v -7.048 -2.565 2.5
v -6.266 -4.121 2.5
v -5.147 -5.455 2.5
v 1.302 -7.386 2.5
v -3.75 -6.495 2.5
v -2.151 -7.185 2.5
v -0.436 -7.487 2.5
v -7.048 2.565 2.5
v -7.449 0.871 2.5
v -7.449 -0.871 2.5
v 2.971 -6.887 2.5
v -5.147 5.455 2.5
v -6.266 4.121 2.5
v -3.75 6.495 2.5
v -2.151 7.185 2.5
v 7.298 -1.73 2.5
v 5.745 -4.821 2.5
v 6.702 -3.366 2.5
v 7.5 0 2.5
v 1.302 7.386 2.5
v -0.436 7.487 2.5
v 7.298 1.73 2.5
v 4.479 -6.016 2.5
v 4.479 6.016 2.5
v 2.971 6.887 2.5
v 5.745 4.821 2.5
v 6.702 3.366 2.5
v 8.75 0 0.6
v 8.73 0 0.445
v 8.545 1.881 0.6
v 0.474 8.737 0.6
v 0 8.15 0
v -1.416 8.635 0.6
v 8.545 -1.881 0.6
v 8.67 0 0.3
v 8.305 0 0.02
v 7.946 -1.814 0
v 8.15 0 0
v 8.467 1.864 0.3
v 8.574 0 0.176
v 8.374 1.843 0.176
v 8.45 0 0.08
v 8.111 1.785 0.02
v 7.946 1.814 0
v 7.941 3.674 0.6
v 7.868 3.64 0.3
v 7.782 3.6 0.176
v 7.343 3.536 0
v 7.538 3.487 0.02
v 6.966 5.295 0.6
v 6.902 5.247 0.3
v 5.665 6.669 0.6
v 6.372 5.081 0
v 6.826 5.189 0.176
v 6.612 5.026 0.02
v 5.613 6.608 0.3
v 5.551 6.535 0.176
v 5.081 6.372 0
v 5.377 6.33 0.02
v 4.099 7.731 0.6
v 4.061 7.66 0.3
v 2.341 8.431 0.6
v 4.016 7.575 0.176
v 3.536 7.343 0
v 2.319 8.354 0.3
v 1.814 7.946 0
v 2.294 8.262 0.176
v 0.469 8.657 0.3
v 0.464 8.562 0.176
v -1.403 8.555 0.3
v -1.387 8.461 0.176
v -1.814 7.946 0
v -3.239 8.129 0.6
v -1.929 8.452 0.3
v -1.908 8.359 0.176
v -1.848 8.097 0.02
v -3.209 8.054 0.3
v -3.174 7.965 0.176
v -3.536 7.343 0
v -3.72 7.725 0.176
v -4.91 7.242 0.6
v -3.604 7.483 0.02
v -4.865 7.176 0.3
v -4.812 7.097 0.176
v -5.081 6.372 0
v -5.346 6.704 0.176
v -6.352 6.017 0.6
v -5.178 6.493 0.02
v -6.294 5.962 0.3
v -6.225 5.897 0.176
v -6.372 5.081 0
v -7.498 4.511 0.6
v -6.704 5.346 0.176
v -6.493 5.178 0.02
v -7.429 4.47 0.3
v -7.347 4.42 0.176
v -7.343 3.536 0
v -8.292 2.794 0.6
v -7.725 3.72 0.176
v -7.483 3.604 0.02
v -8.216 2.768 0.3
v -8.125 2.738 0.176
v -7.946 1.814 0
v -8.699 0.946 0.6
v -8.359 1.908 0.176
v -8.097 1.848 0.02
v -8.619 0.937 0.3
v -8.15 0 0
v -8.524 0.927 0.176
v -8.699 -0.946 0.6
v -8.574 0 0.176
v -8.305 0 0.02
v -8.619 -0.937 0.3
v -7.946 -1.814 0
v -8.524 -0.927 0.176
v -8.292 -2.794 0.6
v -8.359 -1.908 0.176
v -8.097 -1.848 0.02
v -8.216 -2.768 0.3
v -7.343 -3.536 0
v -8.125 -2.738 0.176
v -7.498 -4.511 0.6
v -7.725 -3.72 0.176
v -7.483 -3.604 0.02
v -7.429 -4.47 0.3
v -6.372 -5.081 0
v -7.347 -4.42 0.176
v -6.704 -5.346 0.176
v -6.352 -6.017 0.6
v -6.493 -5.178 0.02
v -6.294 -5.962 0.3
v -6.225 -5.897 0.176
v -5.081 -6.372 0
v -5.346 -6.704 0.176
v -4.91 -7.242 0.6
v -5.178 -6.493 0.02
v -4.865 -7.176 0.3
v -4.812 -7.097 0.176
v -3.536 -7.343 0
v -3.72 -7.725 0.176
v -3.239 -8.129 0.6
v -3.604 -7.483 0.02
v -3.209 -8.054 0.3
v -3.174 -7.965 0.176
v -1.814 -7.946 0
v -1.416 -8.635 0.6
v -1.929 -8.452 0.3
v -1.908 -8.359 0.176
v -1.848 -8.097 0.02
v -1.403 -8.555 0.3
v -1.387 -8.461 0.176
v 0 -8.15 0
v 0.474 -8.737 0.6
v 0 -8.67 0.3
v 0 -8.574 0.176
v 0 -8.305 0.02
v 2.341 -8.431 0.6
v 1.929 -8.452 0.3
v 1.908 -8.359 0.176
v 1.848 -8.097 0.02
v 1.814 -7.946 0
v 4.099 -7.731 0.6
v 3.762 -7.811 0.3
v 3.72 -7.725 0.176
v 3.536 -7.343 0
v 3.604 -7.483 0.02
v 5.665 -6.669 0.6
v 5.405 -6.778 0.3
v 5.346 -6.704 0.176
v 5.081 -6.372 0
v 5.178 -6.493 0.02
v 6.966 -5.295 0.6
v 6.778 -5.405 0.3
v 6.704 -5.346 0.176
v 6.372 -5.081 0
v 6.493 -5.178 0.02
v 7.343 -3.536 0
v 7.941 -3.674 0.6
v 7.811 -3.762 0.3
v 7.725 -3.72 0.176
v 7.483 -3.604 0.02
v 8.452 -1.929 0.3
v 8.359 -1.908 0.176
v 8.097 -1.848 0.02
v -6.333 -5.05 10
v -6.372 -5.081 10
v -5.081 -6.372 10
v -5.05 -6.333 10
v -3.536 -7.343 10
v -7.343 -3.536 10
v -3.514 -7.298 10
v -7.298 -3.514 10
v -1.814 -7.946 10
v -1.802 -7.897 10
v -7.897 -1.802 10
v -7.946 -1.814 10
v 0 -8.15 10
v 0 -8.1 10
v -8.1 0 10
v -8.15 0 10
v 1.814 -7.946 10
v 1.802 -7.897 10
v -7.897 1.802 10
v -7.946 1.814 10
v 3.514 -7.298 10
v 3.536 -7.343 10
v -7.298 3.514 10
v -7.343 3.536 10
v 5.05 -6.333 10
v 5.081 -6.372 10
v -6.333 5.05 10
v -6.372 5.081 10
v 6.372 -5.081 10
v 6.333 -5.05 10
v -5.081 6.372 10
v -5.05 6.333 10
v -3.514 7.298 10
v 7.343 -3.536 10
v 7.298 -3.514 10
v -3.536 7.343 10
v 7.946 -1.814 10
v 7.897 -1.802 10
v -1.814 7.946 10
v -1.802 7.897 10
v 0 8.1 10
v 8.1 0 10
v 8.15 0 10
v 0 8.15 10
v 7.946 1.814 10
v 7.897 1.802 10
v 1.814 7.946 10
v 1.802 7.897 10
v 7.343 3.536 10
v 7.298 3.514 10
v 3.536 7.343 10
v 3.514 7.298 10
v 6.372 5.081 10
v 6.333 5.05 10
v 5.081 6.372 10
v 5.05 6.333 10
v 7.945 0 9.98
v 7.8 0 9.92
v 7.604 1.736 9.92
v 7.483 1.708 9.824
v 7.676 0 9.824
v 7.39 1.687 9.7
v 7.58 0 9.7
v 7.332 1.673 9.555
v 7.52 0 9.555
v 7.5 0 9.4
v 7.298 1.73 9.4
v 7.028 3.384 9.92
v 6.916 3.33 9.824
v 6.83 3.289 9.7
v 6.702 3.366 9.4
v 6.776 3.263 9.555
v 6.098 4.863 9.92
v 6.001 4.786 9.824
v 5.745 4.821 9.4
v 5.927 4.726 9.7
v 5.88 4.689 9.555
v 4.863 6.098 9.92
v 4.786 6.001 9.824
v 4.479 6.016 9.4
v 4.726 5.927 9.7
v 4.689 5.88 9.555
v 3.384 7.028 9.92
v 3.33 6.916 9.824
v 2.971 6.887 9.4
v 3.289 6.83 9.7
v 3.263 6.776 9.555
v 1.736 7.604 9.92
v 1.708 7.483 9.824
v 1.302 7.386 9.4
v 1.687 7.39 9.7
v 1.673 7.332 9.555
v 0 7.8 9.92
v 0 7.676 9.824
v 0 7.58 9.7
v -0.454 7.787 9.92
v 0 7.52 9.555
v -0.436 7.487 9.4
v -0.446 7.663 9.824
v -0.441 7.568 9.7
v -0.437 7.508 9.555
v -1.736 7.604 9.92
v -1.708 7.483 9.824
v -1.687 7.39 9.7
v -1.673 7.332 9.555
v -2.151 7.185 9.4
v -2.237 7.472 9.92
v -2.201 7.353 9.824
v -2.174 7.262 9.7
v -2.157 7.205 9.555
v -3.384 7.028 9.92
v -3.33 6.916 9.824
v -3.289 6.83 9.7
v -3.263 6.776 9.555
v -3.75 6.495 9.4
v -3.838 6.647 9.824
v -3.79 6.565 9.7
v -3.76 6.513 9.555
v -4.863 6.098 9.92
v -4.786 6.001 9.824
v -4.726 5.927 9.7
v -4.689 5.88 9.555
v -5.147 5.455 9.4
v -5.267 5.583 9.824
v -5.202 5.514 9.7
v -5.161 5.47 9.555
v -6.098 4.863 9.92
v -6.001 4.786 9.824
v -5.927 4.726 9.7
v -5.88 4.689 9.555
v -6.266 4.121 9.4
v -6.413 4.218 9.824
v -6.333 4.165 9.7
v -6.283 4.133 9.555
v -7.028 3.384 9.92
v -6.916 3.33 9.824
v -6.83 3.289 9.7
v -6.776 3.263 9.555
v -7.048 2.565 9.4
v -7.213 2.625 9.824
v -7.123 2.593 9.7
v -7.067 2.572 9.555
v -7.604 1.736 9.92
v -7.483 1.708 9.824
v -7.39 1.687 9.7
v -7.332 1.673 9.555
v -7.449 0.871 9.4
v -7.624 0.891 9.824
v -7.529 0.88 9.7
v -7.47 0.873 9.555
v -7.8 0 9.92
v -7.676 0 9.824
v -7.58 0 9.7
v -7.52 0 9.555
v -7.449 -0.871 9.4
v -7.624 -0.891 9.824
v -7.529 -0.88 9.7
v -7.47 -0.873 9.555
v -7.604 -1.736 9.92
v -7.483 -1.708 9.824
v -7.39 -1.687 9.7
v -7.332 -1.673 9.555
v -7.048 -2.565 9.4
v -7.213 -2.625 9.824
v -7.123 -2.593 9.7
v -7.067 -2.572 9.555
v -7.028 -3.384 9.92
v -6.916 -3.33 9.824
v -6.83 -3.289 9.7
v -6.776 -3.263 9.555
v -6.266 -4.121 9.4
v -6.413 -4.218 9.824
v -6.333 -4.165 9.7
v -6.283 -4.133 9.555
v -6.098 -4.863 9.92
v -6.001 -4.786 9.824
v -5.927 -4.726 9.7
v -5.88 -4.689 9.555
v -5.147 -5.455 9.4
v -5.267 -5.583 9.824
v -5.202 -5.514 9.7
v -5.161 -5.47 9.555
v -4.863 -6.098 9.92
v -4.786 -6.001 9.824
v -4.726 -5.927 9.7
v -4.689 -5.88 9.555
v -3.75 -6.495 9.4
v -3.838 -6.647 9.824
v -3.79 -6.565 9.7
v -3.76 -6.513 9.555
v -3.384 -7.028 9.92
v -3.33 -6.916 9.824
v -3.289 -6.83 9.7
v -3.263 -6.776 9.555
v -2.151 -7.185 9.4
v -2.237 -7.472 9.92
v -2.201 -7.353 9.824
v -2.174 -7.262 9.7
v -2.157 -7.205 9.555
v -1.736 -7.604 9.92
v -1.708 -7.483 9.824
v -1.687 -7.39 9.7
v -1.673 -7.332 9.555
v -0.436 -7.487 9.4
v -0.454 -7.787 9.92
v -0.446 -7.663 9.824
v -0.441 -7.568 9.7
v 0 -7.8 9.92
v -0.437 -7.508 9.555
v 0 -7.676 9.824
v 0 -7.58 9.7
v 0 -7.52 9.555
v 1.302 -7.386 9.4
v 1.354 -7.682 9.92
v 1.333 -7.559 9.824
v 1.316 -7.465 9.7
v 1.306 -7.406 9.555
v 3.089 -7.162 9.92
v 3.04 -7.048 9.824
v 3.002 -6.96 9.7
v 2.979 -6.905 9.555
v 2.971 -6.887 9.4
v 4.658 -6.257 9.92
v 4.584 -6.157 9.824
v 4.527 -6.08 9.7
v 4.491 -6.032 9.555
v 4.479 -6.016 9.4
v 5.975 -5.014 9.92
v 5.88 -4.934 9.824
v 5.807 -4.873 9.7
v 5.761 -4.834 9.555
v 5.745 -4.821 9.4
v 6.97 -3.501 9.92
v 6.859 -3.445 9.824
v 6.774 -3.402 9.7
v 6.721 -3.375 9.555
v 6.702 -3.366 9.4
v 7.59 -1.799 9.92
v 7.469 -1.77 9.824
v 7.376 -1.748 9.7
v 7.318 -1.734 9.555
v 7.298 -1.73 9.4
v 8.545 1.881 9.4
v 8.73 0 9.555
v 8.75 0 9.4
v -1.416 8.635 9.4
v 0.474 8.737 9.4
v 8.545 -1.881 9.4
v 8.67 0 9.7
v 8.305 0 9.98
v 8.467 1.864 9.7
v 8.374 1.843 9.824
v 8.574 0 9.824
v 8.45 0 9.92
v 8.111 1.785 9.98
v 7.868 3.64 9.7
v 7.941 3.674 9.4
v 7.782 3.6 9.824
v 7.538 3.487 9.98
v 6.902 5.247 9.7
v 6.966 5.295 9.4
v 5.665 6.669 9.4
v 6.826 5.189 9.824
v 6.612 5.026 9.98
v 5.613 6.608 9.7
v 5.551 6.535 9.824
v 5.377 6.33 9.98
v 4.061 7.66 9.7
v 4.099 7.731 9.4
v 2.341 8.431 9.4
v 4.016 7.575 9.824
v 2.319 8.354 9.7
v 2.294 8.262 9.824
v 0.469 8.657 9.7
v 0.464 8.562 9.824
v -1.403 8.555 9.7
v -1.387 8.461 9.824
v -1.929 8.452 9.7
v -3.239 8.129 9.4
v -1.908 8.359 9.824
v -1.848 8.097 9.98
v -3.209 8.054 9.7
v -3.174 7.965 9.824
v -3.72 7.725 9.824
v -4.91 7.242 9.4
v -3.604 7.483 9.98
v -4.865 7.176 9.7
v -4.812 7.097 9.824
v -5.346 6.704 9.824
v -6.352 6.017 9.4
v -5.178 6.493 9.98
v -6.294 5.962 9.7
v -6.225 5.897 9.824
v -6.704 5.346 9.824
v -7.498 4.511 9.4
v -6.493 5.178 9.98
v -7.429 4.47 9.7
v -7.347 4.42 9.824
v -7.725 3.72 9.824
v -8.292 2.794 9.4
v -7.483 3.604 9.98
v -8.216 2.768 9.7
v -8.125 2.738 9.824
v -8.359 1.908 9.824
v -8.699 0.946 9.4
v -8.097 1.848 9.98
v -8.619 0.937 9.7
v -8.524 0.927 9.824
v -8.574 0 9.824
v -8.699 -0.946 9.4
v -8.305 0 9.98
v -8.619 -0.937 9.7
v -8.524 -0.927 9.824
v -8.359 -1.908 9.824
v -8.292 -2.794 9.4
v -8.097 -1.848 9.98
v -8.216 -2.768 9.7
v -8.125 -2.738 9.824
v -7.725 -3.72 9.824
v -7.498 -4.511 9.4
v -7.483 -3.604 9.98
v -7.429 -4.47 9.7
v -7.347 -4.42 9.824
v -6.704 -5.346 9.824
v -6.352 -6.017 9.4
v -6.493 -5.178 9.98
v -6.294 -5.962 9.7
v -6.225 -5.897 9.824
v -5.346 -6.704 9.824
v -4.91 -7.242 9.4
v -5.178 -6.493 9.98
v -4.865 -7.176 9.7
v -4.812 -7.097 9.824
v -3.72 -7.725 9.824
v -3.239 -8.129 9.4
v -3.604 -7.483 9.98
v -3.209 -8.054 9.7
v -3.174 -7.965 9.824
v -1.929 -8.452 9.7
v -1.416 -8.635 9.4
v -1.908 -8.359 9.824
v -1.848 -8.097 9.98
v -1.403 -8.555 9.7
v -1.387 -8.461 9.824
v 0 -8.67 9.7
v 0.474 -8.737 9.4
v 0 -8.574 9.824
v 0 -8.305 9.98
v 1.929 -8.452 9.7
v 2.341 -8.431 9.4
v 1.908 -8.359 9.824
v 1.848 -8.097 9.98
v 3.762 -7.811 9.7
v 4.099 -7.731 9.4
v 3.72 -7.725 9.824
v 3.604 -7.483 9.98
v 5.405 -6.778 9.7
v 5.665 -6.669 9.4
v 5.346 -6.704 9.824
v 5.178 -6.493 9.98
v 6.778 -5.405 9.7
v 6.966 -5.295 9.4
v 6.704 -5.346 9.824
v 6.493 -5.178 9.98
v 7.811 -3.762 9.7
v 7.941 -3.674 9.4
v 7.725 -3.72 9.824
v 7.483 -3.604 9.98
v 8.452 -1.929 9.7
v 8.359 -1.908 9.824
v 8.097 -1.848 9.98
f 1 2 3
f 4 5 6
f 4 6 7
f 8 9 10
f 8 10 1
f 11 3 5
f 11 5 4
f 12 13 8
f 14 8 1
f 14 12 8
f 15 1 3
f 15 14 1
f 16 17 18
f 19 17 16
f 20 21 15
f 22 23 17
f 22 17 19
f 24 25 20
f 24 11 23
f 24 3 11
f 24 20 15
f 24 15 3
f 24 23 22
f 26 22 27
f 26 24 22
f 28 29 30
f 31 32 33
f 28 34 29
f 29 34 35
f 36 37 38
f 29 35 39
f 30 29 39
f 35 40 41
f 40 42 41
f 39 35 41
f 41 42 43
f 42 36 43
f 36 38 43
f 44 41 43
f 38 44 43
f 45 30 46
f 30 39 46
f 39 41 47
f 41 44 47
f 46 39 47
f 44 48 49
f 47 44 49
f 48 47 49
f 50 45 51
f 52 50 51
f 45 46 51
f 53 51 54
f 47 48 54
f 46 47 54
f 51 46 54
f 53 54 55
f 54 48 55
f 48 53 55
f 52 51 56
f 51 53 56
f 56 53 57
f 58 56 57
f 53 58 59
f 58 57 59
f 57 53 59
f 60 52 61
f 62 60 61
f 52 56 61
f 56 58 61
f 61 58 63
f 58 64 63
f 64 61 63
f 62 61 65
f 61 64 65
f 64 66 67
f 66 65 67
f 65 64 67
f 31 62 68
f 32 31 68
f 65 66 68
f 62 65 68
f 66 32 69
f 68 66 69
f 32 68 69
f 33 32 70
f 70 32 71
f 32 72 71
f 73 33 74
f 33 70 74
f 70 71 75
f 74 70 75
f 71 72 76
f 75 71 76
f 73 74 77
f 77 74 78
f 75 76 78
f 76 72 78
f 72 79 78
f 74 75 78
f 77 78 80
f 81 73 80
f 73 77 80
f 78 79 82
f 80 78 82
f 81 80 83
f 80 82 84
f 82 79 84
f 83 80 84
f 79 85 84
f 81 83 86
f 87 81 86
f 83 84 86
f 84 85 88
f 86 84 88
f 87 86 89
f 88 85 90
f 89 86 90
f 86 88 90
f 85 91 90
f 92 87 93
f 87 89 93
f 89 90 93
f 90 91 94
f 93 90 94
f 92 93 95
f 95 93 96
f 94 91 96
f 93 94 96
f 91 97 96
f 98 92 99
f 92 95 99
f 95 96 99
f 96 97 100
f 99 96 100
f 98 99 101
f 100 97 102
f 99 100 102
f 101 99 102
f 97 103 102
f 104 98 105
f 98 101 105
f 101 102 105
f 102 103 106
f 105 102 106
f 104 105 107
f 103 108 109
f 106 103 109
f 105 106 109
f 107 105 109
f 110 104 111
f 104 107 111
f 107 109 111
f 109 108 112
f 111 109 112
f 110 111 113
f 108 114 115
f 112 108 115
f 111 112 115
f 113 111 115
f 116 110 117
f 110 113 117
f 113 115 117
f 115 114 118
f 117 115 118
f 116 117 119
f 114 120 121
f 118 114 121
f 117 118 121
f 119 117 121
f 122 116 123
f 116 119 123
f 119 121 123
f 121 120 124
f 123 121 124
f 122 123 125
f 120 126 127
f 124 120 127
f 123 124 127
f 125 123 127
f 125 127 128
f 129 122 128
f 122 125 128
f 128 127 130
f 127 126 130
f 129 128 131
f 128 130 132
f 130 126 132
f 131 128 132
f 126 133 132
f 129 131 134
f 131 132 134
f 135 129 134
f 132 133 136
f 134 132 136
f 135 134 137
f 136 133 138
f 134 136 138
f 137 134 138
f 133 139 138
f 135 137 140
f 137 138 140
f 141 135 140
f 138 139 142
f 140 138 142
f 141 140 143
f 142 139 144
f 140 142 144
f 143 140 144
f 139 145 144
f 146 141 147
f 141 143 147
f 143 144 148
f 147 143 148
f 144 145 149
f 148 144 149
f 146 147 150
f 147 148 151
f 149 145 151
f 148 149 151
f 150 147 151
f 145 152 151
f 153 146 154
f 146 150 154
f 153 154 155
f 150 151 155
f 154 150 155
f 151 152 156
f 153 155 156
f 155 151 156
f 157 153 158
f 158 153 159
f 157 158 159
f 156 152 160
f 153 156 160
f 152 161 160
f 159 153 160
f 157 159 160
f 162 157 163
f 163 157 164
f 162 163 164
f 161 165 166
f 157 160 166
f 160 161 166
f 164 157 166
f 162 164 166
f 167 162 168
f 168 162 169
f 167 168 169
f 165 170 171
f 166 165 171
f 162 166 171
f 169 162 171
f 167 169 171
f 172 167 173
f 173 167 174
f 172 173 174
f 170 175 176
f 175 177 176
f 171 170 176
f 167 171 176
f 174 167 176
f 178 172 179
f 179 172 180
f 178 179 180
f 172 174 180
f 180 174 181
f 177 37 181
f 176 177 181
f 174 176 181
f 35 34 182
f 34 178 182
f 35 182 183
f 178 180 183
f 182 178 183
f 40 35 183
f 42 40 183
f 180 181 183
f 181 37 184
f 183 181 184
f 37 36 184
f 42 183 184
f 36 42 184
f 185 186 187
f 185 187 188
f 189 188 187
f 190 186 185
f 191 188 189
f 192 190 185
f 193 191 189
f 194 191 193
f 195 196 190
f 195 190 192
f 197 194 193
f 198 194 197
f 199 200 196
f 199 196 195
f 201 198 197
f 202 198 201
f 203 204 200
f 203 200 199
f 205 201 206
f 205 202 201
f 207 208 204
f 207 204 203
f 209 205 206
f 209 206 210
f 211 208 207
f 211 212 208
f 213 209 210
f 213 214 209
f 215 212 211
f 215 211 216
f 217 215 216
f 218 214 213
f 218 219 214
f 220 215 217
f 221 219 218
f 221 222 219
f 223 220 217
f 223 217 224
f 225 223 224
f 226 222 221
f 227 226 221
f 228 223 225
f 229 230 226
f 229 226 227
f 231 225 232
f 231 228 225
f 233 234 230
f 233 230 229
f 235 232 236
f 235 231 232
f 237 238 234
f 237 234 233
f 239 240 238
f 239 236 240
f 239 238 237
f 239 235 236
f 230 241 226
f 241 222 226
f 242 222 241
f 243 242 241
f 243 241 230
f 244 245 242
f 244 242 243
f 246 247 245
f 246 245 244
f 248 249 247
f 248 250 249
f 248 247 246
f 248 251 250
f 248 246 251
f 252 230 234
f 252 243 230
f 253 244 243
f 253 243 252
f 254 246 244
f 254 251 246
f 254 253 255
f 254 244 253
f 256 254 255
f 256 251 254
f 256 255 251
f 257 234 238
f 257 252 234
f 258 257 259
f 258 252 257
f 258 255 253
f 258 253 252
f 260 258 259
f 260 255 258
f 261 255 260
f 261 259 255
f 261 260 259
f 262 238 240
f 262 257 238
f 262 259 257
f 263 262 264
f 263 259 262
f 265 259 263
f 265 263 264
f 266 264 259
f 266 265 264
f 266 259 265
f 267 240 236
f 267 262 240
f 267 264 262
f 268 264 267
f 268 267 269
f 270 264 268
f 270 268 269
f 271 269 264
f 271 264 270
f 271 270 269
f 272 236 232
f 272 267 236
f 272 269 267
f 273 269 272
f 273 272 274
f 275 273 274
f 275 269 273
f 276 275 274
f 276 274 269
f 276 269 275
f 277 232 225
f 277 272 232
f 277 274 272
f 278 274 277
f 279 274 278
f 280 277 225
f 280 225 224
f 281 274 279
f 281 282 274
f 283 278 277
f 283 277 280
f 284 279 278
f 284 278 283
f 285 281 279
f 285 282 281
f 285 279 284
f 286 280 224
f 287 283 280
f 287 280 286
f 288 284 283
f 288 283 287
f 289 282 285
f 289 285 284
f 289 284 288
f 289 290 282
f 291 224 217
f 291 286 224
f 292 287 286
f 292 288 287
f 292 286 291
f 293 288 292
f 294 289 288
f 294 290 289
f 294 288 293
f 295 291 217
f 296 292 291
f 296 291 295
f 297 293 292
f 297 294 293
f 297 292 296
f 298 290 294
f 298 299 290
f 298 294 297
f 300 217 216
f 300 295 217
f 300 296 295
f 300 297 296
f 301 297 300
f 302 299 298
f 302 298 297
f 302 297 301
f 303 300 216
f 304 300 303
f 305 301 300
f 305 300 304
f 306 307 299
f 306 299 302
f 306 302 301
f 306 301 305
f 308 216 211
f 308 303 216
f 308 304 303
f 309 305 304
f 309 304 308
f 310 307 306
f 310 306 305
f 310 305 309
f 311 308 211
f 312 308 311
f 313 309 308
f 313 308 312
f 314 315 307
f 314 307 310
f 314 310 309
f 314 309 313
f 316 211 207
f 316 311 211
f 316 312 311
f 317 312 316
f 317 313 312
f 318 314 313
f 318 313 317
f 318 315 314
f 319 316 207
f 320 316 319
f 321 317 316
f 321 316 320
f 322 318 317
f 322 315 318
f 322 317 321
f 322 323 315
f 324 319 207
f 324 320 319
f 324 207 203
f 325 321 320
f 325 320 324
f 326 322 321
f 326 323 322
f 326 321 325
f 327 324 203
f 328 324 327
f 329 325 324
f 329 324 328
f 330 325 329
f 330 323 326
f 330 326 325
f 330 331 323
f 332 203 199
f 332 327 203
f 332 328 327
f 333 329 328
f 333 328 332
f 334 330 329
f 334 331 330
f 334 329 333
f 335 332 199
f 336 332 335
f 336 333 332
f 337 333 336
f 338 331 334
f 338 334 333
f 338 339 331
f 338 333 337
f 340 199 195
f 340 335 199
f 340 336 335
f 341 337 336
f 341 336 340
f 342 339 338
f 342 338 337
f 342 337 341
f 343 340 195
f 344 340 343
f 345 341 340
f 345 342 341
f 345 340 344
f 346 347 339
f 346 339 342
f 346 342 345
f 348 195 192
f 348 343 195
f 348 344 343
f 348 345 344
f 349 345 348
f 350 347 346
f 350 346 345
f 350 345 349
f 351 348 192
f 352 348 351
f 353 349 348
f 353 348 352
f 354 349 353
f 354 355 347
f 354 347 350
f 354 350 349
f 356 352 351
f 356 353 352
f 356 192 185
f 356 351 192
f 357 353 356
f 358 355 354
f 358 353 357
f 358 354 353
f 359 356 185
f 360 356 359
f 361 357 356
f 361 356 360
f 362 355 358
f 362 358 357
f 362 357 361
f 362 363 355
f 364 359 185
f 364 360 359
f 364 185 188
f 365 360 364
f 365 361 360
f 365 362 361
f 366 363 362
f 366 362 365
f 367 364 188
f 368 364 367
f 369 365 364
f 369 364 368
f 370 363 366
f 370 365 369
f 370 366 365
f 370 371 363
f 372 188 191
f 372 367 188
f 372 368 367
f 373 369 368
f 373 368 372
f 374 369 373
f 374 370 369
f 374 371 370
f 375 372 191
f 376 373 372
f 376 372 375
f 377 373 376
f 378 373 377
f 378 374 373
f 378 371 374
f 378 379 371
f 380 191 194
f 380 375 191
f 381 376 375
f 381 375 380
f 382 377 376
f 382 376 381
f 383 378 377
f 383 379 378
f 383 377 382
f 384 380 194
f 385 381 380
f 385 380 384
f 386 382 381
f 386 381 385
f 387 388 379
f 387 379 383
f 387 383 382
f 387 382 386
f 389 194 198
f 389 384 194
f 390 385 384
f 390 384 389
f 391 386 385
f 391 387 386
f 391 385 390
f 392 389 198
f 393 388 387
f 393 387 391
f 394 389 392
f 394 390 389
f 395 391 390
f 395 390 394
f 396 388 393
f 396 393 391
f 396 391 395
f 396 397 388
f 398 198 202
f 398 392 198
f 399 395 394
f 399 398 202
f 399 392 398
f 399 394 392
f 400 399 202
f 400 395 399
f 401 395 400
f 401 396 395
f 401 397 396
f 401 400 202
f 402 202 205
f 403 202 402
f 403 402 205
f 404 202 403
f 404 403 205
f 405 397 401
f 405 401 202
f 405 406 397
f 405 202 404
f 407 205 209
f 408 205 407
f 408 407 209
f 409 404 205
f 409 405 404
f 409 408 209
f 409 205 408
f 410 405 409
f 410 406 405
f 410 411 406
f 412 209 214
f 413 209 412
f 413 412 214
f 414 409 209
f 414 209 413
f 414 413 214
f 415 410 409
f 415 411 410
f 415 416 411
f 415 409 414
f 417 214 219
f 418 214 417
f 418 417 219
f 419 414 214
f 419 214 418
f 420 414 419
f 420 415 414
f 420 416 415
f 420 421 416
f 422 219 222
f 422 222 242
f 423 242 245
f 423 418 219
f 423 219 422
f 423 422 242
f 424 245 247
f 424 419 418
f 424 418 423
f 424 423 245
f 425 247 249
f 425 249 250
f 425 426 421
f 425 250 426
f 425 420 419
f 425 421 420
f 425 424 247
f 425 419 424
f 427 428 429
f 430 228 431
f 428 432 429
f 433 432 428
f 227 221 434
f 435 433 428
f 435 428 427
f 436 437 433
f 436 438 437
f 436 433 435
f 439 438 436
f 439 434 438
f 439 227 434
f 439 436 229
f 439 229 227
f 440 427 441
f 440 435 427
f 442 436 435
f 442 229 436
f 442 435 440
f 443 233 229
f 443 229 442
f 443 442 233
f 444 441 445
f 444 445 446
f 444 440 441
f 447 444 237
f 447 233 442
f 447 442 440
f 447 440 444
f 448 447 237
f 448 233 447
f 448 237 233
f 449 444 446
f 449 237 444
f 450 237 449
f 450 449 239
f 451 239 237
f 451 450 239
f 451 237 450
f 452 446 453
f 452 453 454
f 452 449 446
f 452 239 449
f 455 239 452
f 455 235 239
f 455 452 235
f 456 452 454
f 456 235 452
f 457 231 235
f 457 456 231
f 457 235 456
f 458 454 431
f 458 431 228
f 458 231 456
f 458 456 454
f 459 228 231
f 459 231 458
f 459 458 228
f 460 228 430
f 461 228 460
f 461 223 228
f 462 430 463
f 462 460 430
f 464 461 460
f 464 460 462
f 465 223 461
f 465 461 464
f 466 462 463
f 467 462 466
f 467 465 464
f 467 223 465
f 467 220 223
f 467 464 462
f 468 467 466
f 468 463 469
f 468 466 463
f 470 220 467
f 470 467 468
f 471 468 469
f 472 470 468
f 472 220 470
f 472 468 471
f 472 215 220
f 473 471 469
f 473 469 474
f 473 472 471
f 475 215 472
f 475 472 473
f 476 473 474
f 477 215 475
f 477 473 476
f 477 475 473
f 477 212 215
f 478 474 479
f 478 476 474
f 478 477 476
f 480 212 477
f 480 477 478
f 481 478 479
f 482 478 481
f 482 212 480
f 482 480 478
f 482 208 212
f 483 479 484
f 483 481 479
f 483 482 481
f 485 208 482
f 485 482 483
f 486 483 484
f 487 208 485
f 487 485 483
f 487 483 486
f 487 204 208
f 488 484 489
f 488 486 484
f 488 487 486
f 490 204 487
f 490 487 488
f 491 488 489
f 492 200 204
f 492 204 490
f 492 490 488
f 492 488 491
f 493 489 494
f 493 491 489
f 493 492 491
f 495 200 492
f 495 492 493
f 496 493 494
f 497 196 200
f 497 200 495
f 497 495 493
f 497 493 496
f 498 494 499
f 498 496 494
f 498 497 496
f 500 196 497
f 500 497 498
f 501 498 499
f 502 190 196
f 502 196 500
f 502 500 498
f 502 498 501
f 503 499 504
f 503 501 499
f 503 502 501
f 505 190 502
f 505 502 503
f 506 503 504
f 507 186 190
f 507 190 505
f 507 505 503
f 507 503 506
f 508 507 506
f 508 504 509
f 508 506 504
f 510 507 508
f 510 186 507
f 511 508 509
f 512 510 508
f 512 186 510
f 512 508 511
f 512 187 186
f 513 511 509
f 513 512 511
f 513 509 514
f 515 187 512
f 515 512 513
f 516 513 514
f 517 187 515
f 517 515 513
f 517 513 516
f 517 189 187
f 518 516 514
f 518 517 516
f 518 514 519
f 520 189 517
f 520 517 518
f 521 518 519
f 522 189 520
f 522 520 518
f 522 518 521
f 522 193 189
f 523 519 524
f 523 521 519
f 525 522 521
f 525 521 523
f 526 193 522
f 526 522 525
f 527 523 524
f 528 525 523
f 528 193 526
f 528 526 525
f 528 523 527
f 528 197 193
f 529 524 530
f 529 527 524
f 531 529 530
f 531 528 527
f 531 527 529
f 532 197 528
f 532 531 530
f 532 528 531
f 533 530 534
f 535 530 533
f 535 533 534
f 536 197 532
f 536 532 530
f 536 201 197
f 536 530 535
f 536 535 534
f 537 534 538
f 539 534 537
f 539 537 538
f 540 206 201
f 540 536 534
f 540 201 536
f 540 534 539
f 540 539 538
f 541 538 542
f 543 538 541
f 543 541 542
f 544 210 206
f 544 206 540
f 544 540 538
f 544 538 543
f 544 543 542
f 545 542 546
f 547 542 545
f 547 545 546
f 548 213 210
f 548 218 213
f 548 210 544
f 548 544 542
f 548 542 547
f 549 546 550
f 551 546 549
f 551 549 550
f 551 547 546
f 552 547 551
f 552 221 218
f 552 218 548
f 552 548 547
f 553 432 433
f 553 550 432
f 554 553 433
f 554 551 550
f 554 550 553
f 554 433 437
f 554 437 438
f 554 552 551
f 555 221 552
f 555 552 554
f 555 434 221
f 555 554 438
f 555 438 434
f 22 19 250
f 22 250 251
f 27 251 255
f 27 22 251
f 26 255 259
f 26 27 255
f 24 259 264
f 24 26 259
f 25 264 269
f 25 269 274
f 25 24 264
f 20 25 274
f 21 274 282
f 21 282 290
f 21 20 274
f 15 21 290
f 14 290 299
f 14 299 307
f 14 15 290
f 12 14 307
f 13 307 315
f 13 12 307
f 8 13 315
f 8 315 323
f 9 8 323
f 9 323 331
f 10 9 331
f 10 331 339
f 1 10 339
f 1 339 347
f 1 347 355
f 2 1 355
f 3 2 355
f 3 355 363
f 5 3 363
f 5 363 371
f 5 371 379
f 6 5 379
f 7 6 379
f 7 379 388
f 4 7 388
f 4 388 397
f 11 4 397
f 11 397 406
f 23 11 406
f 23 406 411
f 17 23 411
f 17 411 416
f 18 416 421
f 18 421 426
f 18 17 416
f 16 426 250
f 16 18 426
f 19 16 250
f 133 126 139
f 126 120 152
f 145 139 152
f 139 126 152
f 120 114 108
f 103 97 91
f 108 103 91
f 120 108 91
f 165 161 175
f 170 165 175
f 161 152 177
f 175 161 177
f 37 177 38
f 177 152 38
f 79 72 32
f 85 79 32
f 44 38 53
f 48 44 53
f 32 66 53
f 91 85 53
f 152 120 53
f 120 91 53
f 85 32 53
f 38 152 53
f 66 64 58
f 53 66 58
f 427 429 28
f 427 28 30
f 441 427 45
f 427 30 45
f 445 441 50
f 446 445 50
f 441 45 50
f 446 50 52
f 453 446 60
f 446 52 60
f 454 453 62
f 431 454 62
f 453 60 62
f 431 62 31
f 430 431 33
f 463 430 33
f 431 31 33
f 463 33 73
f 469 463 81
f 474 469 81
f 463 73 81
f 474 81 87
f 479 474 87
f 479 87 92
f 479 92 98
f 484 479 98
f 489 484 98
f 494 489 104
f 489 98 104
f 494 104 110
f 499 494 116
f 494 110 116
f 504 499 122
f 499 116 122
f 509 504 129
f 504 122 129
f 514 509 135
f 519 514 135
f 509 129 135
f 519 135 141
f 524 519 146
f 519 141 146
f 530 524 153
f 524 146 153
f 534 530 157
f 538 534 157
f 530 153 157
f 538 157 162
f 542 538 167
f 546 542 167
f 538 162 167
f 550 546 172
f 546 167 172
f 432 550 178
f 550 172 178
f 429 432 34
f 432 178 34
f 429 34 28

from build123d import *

# Parameters (mm, degrees)
F0_R     = 7.5
F1_DEPTH = 2.5
F0_R_2   = 8.75
F2_DEPTH = 10
F3_R     = 0.6


with BuildPart() as f1:
    # F0 (on Top) → F1 (new body)
    with BuildSketch(Plane.XY):
        Circle(F0_R)
    extrude(amount=F1_DEPTH)

    # F0 (on Top) → F2 (join)
    with BuildSketch(Plane.XY):
        Circle(F0_R_2)
        Circle(F0_R, mode=Mode.SUBTRACT)
    extrude(amount=F2_DEPTH)

    # F3
    f3_edges = [f1.edges().sort_by_distance(p)[0] for p in [
        (-7.5, 0, 10),
        (-8.75, 0, 10),
        (-8.75, 0, 0),
    ]]
    fillet(f3_edges, radius=F3_R)


solid = f1.part
